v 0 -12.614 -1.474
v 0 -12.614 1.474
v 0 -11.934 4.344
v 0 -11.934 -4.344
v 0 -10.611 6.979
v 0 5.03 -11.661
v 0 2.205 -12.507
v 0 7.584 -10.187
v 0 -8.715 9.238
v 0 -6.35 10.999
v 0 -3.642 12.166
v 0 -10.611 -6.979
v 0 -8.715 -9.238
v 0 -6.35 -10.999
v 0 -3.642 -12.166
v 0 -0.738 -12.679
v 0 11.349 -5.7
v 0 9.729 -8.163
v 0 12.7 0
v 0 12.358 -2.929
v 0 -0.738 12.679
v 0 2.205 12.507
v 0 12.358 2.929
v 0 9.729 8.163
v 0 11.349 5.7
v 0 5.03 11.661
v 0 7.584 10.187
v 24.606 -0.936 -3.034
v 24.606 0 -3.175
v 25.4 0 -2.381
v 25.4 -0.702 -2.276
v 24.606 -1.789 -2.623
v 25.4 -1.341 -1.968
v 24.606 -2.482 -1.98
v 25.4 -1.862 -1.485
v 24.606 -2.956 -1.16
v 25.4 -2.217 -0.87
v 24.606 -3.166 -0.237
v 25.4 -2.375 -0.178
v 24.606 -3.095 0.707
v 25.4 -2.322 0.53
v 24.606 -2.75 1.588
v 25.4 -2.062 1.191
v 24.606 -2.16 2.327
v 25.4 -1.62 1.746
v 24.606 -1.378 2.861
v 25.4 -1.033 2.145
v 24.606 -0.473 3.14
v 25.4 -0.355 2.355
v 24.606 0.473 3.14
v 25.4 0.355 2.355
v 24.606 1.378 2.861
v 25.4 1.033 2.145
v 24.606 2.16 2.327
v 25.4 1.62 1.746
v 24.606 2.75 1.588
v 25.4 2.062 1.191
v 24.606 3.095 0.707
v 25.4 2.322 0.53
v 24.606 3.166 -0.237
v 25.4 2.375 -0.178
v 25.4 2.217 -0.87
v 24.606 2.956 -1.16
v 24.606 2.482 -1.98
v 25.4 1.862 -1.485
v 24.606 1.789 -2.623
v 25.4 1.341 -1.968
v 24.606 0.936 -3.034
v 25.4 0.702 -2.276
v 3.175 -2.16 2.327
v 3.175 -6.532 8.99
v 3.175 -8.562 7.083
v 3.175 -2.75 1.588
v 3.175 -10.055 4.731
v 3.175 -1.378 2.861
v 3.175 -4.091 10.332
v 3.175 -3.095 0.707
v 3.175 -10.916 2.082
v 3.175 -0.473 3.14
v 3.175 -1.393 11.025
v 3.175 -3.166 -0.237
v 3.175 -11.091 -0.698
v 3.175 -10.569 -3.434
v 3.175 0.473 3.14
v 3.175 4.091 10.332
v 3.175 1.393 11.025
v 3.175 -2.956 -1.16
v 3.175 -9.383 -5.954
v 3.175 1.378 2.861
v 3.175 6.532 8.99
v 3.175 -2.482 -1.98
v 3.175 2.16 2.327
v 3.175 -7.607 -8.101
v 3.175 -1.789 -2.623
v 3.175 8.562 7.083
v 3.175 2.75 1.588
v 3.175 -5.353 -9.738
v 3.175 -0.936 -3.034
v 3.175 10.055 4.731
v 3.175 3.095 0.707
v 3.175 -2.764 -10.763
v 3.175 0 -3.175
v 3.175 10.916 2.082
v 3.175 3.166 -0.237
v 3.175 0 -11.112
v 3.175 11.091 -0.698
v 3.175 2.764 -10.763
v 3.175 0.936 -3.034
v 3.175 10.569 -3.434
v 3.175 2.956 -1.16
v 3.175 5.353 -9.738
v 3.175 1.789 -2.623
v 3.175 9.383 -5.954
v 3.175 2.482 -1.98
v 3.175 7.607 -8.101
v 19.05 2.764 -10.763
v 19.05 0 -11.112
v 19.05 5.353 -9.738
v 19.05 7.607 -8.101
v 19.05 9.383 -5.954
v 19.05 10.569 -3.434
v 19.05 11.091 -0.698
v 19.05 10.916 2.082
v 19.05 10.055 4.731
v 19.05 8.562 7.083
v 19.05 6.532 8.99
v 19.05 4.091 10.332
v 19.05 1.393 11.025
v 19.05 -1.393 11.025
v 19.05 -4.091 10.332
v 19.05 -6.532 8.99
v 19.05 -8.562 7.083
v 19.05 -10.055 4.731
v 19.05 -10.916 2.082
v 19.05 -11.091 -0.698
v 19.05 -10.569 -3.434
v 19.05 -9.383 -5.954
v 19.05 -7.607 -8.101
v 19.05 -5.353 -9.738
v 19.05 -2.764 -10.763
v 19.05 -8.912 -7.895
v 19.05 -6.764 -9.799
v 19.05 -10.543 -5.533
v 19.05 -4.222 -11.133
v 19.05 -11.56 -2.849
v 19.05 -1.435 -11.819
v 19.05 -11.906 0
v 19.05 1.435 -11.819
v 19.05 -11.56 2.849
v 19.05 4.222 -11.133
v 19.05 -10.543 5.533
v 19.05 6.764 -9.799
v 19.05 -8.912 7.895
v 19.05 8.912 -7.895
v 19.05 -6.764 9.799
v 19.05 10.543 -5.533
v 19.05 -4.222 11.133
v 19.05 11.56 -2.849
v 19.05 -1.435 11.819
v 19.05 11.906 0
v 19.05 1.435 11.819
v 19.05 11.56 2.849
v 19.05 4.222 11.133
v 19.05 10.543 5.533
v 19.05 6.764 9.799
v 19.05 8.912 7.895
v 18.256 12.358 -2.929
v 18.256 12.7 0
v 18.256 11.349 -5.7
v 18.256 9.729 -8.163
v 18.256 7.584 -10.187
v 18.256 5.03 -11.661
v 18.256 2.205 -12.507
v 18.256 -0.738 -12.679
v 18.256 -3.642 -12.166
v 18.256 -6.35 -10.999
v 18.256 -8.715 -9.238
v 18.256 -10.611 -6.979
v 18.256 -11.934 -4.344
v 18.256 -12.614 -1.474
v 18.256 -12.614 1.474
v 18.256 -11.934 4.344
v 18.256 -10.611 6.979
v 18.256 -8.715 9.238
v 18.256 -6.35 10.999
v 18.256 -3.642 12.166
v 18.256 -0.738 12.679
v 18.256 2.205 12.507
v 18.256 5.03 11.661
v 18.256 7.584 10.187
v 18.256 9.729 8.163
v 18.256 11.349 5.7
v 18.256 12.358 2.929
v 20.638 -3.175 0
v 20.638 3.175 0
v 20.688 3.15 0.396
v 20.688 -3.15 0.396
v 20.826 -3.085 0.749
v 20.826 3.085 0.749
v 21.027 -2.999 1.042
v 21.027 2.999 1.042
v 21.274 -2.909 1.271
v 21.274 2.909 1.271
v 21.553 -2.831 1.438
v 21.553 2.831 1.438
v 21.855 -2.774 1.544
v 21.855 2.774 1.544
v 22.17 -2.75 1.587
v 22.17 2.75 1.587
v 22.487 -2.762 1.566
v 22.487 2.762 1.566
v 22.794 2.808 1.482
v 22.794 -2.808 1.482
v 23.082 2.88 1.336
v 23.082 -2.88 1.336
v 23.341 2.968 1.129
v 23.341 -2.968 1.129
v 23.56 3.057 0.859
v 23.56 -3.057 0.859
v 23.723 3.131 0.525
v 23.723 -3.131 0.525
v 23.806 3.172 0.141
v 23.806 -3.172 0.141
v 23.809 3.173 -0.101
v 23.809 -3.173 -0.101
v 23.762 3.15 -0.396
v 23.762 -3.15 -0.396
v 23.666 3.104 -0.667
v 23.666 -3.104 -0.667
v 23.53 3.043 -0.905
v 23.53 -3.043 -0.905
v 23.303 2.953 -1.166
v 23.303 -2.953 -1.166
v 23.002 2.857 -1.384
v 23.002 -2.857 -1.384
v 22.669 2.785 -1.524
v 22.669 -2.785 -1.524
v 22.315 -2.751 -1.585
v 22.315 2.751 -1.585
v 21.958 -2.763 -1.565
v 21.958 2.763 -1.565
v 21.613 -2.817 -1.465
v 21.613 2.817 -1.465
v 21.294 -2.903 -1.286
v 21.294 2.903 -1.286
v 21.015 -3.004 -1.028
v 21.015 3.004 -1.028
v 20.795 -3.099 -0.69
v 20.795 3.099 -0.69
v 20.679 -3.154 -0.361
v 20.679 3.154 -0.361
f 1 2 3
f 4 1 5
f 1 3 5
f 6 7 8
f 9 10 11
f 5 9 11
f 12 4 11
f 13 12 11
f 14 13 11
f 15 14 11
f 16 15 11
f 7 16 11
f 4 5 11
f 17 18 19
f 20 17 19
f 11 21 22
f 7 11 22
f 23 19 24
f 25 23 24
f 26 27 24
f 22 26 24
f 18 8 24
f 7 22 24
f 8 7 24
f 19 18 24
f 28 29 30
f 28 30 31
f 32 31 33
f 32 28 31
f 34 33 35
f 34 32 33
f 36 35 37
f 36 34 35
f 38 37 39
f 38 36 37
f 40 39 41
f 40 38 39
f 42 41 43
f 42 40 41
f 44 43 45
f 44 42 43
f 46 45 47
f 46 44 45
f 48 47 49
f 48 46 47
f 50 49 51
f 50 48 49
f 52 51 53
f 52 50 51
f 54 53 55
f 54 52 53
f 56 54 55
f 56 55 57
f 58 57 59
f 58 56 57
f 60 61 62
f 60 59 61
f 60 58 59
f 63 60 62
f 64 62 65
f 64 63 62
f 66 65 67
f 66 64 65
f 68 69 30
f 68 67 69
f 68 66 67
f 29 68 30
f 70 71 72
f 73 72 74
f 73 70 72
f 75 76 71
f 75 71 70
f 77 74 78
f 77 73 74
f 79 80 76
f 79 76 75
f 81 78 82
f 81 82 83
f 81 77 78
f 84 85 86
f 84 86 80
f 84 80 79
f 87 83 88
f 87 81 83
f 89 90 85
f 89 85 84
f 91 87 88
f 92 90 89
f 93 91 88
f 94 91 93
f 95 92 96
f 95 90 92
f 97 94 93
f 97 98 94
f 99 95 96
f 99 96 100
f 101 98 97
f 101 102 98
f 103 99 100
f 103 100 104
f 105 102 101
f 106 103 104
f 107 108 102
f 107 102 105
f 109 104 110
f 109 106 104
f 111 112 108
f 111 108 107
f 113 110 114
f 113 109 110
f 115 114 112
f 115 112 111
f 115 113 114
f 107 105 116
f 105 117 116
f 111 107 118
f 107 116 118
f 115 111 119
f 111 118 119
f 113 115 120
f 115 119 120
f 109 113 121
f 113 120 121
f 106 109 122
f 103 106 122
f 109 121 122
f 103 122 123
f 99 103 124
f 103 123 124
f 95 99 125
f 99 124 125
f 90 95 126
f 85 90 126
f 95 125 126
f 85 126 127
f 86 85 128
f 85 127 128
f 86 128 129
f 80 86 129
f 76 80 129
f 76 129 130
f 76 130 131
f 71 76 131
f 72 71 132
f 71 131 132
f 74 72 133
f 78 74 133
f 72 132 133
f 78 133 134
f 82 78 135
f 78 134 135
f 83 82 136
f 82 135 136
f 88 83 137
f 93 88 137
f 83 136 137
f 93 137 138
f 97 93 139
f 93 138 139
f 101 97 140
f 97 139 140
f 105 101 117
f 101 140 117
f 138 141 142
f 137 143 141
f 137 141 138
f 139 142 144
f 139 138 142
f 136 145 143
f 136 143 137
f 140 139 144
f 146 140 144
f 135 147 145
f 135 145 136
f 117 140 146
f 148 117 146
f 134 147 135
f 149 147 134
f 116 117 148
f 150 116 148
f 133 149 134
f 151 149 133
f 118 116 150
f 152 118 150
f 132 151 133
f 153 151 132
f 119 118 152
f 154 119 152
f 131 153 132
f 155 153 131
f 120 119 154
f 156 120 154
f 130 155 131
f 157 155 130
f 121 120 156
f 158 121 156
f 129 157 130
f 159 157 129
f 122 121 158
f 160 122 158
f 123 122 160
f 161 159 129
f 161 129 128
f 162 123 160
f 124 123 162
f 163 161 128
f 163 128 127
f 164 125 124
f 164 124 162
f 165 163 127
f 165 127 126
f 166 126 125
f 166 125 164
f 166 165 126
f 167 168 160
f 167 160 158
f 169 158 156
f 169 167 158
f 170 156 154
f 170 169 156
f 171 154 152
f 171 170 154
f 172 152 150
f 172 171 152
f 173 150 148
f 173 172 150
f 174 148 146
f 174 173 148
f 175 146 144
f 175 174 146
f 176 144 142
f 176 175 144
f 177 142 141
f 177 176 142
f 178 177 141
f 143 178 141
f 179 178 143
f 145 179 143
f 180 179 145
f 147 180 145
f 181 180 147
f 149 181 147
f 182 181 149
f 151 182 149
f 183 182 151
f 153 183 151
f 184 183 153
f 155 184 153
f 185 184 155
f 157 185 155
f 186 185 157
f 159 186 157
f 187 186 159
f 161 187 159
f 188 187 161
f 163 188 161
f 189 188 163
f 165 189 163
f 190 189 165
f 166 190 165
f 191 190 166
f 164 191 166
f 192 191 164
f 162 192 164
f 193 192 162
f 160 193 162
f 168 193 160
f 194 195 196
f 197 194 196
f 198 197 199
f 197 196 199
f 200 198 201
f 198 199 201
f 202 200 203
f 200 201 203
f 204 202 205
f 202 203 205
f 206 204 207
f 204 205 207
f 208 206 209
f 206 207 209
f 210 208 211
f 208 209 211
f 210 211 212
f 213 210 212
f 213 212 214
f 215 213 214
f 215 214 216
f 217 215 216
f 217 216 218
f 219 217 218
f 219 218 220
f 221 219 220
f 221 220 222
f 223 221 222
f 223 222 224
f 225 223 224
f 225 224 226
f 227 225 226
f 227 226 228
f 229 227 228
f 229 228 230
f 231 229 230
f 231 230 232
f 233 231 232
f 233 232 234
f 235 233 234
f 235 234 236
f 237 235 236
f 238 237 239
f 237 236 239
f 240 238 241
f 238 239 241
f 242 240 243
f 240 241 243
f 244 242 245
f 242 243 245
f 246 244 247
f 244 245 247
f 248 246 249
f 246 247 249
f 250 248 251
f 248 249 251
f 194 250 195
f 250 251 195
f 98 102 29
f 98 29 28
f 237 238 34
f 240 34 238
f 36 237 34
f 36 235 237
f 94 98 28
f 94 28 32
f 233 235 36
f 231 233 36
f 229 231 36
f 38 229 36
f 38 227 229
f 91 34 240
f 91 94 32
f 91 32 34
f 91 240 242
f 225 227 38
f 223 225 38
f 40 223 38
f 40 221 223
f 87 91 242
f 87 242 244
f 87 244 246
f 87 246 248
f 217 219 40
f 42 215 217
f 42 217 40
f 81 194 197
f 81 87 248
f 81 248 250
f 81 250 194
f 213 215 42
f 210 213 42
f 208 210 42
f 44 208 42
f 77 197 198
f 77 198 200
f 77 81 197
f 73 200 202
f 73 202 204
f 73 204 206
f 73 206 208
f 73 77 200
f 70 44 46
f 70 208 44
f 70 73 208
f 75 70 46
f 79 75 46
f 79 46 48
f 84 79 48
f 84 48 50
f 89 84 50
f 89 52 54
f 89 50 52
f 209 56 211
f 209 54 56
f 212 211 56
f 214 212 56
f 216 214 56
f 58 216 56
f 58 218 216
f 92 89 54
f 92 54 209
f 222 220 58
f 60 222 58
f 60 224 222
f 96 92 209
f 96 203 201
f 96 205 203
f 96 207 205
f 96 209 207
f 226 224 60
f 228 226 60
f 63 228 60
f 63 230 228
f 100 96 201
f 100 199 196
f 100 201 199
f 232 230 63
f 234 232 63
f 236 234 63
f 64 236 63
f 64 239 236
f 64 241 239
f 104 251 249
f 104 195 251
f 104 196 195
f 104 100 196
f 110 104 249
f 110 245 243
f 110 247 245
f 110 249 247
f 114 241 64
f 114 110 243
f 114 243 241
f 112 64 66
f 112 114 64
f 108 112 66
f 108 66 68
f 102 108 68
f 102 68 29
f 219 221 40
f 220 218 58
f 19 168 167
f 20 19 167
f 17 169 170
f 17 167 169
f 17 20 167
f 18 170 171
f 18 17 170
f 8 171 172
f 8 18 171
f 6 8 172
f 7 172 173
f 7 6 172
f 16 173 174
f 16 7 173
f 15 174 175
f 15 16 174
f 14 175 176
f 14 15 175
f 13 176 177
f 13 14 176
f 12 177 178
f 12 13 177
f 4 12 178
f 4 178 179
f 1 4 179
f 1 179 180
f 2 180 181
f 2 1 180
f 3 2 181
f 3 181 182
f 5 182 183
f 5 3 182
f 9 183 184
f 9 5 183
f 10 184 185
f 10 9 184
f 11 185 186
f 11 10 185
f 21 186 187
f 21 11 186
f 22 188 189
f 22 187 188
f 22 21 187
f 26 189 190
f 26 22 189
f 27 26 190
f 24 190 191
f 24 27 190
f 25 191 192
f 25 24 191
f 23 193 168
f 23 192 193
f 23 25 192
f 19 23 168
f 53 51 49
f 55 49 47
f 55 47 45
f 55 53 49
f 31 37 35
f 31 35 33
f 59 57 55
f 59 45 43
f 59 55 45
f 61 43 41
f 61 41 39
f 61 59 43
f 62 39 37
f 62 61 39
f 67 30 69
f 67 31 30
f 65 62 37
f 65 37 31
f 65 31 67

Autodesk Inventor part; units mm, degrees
ref_plane "YZ Plane" through (0, 0, 0) normal (1, 0, 0) x (0, 1, 0)
ref_plane "XZ Plane" through (0, 0, 0) normal (0, 1, 0) x (-1, 0, 0)
ref_plane "XY Plane" through (0, 0, 0) normal (0, 0, 1) x (1, 0, 0)
sketch "Sketch1" plane through (0, 0, 0) normal (1, 0, 0) x (0, 1, 0)
  circle A0 centre (0, 0) radius 12.7
  dimension "d0" = 25.4
extrude "Extrusion1" add sketch "Sketch1" along normal blind 19.05
sketch "Sketch2" plane through (19.05, 0, 0) normal (1, 0, 0) x (0, 0, -1)
  circle A0 centre (0, 0) radius 11.1125
  dimension "d3" = 22.225
extrude "Extrusion2" cut sketch "Sketch2" against normal blind 15.875
sketch "Sketch3" plane through (3.175, 0, 0) normal (1, 0, 0) x (0, 0, -1)
  circle A0 centre (0, 0) radius 3.175
  dimension "d6" = 6.35
extrude "Extrusion3" add sketch "Sketch3" along normal blind 22.225
sketch "Sketch4" plane through (0, 0, 0) normal (0, 1, 0) x (-1, 0, 0)
  circle A0 centre (-22.225, 0) radius 1.5875
  line L0 (-25.4, 3.175) -> (-25.4, -3.175) projected
  point P0 (0, 0)
  dimension "d9" = 3.175
  dimension "d10" = 3.175
extrude "Extrusion4" cut sketch "Sketch4" against normal mid plane 22.225
chamfer "Chamfer1" distance 0.7937 angle 45 2 edges at (19.05, -12.7, 0) (25.4, 0, 3.175)
